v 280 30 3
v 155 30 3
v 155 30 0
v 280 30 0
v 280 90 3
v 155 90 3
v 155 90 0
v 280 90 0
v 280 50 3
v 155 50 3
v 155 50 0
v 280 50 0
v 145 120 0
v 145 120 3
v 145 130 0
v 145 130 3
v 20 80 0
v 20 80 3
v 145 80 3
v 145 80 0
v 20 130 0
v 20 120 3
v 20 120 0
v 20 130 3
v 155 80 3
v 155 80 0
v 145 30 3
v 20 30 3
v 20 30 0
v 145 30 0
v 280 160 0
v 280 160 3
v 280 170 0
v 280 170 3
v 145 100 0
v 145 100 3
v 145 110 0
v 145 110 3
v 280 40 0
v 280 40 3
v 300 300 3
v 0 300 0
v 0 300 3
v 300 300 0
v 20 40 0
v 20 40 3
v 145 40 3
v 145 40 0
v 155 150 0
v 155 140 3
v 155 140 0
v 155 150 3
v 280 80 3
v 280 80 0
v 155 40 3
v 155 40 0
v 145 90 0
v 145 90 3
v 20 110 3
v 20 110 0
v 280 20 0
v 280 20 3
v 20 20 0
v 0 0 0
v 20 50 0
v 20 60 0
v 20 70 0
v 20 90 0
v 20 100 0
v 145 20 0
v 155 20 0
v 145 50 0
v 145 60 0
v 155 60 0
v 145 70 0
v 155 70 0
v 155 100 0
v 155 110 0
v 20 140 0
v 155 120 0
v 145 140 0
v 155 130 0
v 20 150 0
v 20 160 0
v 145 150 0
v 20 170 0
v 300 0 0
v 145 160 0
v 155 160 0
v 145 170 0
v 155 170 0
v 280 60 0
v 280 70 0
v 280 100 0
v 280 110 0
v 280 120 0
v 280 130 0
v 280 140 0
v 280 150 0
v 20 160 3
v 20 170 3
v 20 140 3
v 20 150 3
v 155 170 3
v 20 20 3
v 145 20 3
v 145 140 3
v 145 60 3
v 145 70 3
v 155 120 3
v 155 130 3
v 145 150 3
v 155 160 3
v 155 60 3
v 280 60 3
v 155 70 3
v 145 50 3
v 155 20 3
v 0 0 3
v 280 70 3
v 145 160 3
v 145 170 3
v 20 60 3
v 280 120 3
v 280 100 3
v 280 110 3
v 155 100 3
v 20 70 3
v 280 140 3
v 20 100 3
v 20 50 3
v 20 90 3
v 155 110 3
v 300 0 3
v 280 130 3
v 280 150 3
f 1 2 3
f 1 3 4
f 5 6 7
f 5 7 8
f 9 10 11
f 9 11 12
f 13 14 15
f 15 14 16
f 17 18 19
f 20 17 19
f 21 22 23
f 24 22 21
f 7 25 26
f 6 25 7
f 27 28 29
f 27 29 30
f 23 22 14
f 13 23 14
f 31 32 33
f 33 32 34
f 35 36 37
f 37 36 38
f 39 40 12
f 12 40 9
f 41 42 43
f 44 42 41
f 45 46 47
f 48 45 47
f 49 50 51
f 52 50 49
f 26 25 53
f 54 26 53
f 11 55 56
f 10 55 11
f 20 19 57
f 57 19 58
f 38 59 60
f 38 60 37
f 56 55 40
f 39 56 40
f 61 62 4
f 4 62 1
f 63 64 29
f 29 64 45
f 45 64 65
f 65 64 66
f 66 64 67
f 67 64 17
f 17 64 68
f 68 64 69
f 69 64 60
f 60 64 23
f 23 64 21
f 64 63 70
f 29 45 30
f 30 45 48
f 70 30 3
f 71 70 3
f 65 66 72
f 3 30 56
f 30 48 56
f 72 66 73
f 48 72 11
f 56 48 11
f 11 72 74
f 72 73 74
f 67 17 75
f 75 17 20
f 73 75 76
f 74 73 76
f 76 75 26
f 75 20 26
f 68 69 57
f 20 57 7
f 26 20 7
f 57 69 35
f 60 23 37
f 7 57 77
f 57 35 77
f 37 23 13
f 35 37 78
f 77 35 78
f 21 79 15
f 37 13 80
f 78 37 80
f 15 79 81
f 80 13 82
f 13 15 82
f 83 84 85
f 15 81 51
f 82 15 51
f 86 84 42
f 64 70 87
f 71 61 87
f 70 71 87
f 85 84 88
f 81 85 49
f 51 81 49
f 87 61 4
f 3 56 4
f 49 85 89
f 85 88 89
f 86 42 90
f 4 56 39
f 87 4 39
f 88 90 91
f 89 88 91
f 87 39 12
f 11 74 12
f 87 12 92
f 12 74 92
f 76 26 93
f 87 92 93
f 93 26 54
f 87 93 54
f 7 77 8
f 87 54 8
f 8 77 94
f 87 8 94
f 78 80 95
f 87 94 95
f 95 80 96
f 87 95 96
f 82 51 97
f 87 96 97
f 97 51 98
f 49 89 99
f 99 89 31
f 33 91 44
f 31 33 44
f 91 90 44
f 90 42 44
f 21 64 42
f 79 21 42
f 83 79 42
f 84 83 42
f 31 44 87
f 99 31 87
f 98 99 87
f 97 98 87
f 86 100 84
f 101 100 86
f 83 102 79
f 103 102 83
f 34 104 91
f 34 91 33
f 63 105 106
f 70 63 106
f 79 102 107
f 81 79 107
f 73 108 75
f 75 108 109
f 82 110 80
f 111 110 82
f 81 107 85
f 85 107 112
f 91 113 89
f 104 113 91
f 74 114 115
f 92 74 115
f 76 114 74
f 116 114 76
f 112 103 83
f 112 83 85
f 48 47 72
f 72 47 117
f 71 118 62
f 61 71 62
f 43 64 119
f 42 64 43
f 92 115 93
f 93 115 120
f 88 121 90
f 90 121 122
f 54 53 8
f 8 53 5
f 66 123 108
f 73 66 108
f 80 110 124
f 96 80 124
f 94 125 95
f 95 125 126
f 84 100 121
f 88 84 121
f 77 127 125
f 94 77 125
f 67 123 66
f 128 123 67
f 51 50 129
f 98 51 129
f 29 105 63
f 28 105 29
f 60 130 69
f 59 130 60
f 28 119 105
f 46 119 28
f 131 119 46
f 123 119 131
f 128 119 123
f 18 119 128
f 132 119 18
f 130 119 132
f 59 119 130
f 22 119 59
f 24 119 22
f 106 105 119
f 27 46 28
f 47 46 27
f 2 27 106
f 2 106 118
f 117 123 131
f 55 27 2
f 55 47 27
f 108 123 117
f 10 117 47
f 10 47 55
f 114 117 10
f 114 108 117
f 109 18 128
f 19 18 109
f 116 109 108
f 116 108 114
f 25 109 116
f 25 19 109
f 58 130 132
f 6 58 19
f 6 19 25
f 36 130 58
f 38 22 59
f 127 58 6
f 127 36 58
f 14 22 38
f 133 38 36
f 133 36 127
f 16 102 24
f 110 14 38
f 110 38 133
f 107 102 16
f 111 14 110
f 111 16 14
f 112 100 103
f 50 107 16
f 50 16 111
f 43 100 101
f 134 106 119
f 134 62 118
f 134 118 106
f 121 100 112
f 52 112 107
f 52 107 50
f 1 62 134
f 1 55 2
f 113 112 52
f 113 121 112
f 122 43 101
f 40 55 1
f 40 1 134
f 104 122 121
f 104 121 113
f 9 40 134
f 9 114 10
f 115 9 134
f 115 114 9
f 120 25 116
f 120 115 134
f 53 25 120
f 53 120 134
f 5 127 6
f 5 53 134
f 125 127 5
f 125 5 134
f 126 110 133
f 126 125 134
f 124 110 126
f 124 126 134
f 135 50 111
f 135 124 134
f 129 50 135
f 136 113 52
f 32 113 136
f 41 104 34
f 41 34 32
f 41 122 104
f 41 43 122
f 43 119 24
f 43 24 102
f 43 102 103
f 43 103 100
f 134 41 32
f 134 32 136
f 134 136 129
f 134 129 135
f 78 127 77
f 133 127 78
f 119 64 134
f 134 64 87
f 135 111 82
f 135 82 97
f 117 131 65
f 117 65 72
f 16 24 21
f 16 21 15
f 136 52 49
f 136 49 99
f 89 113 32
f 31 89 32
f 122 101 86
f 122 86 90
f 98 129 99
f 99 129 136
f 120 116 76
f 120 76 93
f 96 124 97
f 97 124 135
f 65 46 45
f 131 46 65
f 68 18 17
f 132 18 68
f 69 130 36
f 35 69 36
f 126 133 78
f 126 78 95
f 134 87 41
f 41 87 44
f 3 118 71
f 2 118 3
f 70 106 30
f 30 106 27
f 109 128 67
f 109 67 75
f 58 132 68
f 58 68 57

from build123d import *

# Parameters (mm, degrees)
CROQUIS1_W              = 300
CROQUIS1_H              = 300
SALIENTE_EXTRUIR1_DEPTH = 3
CROQUIS2_W              = 125
CROQUIS2_H              = 10
CORTAR_EXTRUIR1_DEPTH   = 10


with BuildPart() as part:
    # Croquis1 → Saliente-Extruir1 (new body)
    with BuildSketch(Plane.XY):
        with Locations((150, 150)):
            Rectangle(CROQUIS1_W, CROQUIS1_H)
    extrude(amount=SALIENTE_EXTRUIR1_DEPTH)

    # Croquis2 → Cortar-Extruir1 (cut)
    with BuildSketch(Plane.XY.offset(3)):
        with Locations((82.5, 25)):
            Rectangle(CROQUIS2_W, CROQUIS2_H)
        with Locations((82.5, 165)):
            Rectangle(CROQUIS2_W, CROQUIS2_H)
        with Locations((82.5, 145)):
            Rectangle(CROQUIS2_W, CROQUIS2_H)
        with Locations((82.5, 125)):
            Rectangle(CROQUIS2_W, CROQUIS2_H)
        with Locations((82.5, 105)):
            Rectangle(CROQUIS2_W, CROQUIS2_H)
        with Locations((82.5, 85)):
            Rectangle(CROQUIS2_W, CROQUIS2_H)
        with Locations((82.5, 65)):
            Rectangle(CROQUIS2_W, CROQUIS2_H)
        with Locations((82.5, 45)):
            Rectangle(CROQUIS2_W, CROQUIS2_H)
        with Locations((217.5, 25)):
            Rectangle(CROQUIS2_W, CROQUIS2_H)
        with Locations((217.5, 45)):
            Rectangle(CROQUIS2_W, CROQUIS2_H)
        with Locations((217.5, 65)):
            Rectangle(CROQUIS2_W, CROQUIS2_H)
        with Locations((217.5, 85)):
            Rectangle(CROQUIS2_W, CROQUIS2_H)
        with Locations((217.5, 105)):
            Rectangle(CROQUIS2_W, CROQUIS2_H)
        with Locations((217.5, 125)):
            Rectangle(CROQUIS2_W, CROQUIS2_H)
        with Locations((217.5, 145)):
            Rectangle(CROQUIS2_W, CROQUIS2_H)
        with Locations((217.5, 165)):
            Rectangle(CROQUIS2_W, CROQUIS2_H)
    extrude(amount=-CORTAR_EXTRUIR1_DEPTH, mode=Mode.SUBTRACT)


solid = part.part
